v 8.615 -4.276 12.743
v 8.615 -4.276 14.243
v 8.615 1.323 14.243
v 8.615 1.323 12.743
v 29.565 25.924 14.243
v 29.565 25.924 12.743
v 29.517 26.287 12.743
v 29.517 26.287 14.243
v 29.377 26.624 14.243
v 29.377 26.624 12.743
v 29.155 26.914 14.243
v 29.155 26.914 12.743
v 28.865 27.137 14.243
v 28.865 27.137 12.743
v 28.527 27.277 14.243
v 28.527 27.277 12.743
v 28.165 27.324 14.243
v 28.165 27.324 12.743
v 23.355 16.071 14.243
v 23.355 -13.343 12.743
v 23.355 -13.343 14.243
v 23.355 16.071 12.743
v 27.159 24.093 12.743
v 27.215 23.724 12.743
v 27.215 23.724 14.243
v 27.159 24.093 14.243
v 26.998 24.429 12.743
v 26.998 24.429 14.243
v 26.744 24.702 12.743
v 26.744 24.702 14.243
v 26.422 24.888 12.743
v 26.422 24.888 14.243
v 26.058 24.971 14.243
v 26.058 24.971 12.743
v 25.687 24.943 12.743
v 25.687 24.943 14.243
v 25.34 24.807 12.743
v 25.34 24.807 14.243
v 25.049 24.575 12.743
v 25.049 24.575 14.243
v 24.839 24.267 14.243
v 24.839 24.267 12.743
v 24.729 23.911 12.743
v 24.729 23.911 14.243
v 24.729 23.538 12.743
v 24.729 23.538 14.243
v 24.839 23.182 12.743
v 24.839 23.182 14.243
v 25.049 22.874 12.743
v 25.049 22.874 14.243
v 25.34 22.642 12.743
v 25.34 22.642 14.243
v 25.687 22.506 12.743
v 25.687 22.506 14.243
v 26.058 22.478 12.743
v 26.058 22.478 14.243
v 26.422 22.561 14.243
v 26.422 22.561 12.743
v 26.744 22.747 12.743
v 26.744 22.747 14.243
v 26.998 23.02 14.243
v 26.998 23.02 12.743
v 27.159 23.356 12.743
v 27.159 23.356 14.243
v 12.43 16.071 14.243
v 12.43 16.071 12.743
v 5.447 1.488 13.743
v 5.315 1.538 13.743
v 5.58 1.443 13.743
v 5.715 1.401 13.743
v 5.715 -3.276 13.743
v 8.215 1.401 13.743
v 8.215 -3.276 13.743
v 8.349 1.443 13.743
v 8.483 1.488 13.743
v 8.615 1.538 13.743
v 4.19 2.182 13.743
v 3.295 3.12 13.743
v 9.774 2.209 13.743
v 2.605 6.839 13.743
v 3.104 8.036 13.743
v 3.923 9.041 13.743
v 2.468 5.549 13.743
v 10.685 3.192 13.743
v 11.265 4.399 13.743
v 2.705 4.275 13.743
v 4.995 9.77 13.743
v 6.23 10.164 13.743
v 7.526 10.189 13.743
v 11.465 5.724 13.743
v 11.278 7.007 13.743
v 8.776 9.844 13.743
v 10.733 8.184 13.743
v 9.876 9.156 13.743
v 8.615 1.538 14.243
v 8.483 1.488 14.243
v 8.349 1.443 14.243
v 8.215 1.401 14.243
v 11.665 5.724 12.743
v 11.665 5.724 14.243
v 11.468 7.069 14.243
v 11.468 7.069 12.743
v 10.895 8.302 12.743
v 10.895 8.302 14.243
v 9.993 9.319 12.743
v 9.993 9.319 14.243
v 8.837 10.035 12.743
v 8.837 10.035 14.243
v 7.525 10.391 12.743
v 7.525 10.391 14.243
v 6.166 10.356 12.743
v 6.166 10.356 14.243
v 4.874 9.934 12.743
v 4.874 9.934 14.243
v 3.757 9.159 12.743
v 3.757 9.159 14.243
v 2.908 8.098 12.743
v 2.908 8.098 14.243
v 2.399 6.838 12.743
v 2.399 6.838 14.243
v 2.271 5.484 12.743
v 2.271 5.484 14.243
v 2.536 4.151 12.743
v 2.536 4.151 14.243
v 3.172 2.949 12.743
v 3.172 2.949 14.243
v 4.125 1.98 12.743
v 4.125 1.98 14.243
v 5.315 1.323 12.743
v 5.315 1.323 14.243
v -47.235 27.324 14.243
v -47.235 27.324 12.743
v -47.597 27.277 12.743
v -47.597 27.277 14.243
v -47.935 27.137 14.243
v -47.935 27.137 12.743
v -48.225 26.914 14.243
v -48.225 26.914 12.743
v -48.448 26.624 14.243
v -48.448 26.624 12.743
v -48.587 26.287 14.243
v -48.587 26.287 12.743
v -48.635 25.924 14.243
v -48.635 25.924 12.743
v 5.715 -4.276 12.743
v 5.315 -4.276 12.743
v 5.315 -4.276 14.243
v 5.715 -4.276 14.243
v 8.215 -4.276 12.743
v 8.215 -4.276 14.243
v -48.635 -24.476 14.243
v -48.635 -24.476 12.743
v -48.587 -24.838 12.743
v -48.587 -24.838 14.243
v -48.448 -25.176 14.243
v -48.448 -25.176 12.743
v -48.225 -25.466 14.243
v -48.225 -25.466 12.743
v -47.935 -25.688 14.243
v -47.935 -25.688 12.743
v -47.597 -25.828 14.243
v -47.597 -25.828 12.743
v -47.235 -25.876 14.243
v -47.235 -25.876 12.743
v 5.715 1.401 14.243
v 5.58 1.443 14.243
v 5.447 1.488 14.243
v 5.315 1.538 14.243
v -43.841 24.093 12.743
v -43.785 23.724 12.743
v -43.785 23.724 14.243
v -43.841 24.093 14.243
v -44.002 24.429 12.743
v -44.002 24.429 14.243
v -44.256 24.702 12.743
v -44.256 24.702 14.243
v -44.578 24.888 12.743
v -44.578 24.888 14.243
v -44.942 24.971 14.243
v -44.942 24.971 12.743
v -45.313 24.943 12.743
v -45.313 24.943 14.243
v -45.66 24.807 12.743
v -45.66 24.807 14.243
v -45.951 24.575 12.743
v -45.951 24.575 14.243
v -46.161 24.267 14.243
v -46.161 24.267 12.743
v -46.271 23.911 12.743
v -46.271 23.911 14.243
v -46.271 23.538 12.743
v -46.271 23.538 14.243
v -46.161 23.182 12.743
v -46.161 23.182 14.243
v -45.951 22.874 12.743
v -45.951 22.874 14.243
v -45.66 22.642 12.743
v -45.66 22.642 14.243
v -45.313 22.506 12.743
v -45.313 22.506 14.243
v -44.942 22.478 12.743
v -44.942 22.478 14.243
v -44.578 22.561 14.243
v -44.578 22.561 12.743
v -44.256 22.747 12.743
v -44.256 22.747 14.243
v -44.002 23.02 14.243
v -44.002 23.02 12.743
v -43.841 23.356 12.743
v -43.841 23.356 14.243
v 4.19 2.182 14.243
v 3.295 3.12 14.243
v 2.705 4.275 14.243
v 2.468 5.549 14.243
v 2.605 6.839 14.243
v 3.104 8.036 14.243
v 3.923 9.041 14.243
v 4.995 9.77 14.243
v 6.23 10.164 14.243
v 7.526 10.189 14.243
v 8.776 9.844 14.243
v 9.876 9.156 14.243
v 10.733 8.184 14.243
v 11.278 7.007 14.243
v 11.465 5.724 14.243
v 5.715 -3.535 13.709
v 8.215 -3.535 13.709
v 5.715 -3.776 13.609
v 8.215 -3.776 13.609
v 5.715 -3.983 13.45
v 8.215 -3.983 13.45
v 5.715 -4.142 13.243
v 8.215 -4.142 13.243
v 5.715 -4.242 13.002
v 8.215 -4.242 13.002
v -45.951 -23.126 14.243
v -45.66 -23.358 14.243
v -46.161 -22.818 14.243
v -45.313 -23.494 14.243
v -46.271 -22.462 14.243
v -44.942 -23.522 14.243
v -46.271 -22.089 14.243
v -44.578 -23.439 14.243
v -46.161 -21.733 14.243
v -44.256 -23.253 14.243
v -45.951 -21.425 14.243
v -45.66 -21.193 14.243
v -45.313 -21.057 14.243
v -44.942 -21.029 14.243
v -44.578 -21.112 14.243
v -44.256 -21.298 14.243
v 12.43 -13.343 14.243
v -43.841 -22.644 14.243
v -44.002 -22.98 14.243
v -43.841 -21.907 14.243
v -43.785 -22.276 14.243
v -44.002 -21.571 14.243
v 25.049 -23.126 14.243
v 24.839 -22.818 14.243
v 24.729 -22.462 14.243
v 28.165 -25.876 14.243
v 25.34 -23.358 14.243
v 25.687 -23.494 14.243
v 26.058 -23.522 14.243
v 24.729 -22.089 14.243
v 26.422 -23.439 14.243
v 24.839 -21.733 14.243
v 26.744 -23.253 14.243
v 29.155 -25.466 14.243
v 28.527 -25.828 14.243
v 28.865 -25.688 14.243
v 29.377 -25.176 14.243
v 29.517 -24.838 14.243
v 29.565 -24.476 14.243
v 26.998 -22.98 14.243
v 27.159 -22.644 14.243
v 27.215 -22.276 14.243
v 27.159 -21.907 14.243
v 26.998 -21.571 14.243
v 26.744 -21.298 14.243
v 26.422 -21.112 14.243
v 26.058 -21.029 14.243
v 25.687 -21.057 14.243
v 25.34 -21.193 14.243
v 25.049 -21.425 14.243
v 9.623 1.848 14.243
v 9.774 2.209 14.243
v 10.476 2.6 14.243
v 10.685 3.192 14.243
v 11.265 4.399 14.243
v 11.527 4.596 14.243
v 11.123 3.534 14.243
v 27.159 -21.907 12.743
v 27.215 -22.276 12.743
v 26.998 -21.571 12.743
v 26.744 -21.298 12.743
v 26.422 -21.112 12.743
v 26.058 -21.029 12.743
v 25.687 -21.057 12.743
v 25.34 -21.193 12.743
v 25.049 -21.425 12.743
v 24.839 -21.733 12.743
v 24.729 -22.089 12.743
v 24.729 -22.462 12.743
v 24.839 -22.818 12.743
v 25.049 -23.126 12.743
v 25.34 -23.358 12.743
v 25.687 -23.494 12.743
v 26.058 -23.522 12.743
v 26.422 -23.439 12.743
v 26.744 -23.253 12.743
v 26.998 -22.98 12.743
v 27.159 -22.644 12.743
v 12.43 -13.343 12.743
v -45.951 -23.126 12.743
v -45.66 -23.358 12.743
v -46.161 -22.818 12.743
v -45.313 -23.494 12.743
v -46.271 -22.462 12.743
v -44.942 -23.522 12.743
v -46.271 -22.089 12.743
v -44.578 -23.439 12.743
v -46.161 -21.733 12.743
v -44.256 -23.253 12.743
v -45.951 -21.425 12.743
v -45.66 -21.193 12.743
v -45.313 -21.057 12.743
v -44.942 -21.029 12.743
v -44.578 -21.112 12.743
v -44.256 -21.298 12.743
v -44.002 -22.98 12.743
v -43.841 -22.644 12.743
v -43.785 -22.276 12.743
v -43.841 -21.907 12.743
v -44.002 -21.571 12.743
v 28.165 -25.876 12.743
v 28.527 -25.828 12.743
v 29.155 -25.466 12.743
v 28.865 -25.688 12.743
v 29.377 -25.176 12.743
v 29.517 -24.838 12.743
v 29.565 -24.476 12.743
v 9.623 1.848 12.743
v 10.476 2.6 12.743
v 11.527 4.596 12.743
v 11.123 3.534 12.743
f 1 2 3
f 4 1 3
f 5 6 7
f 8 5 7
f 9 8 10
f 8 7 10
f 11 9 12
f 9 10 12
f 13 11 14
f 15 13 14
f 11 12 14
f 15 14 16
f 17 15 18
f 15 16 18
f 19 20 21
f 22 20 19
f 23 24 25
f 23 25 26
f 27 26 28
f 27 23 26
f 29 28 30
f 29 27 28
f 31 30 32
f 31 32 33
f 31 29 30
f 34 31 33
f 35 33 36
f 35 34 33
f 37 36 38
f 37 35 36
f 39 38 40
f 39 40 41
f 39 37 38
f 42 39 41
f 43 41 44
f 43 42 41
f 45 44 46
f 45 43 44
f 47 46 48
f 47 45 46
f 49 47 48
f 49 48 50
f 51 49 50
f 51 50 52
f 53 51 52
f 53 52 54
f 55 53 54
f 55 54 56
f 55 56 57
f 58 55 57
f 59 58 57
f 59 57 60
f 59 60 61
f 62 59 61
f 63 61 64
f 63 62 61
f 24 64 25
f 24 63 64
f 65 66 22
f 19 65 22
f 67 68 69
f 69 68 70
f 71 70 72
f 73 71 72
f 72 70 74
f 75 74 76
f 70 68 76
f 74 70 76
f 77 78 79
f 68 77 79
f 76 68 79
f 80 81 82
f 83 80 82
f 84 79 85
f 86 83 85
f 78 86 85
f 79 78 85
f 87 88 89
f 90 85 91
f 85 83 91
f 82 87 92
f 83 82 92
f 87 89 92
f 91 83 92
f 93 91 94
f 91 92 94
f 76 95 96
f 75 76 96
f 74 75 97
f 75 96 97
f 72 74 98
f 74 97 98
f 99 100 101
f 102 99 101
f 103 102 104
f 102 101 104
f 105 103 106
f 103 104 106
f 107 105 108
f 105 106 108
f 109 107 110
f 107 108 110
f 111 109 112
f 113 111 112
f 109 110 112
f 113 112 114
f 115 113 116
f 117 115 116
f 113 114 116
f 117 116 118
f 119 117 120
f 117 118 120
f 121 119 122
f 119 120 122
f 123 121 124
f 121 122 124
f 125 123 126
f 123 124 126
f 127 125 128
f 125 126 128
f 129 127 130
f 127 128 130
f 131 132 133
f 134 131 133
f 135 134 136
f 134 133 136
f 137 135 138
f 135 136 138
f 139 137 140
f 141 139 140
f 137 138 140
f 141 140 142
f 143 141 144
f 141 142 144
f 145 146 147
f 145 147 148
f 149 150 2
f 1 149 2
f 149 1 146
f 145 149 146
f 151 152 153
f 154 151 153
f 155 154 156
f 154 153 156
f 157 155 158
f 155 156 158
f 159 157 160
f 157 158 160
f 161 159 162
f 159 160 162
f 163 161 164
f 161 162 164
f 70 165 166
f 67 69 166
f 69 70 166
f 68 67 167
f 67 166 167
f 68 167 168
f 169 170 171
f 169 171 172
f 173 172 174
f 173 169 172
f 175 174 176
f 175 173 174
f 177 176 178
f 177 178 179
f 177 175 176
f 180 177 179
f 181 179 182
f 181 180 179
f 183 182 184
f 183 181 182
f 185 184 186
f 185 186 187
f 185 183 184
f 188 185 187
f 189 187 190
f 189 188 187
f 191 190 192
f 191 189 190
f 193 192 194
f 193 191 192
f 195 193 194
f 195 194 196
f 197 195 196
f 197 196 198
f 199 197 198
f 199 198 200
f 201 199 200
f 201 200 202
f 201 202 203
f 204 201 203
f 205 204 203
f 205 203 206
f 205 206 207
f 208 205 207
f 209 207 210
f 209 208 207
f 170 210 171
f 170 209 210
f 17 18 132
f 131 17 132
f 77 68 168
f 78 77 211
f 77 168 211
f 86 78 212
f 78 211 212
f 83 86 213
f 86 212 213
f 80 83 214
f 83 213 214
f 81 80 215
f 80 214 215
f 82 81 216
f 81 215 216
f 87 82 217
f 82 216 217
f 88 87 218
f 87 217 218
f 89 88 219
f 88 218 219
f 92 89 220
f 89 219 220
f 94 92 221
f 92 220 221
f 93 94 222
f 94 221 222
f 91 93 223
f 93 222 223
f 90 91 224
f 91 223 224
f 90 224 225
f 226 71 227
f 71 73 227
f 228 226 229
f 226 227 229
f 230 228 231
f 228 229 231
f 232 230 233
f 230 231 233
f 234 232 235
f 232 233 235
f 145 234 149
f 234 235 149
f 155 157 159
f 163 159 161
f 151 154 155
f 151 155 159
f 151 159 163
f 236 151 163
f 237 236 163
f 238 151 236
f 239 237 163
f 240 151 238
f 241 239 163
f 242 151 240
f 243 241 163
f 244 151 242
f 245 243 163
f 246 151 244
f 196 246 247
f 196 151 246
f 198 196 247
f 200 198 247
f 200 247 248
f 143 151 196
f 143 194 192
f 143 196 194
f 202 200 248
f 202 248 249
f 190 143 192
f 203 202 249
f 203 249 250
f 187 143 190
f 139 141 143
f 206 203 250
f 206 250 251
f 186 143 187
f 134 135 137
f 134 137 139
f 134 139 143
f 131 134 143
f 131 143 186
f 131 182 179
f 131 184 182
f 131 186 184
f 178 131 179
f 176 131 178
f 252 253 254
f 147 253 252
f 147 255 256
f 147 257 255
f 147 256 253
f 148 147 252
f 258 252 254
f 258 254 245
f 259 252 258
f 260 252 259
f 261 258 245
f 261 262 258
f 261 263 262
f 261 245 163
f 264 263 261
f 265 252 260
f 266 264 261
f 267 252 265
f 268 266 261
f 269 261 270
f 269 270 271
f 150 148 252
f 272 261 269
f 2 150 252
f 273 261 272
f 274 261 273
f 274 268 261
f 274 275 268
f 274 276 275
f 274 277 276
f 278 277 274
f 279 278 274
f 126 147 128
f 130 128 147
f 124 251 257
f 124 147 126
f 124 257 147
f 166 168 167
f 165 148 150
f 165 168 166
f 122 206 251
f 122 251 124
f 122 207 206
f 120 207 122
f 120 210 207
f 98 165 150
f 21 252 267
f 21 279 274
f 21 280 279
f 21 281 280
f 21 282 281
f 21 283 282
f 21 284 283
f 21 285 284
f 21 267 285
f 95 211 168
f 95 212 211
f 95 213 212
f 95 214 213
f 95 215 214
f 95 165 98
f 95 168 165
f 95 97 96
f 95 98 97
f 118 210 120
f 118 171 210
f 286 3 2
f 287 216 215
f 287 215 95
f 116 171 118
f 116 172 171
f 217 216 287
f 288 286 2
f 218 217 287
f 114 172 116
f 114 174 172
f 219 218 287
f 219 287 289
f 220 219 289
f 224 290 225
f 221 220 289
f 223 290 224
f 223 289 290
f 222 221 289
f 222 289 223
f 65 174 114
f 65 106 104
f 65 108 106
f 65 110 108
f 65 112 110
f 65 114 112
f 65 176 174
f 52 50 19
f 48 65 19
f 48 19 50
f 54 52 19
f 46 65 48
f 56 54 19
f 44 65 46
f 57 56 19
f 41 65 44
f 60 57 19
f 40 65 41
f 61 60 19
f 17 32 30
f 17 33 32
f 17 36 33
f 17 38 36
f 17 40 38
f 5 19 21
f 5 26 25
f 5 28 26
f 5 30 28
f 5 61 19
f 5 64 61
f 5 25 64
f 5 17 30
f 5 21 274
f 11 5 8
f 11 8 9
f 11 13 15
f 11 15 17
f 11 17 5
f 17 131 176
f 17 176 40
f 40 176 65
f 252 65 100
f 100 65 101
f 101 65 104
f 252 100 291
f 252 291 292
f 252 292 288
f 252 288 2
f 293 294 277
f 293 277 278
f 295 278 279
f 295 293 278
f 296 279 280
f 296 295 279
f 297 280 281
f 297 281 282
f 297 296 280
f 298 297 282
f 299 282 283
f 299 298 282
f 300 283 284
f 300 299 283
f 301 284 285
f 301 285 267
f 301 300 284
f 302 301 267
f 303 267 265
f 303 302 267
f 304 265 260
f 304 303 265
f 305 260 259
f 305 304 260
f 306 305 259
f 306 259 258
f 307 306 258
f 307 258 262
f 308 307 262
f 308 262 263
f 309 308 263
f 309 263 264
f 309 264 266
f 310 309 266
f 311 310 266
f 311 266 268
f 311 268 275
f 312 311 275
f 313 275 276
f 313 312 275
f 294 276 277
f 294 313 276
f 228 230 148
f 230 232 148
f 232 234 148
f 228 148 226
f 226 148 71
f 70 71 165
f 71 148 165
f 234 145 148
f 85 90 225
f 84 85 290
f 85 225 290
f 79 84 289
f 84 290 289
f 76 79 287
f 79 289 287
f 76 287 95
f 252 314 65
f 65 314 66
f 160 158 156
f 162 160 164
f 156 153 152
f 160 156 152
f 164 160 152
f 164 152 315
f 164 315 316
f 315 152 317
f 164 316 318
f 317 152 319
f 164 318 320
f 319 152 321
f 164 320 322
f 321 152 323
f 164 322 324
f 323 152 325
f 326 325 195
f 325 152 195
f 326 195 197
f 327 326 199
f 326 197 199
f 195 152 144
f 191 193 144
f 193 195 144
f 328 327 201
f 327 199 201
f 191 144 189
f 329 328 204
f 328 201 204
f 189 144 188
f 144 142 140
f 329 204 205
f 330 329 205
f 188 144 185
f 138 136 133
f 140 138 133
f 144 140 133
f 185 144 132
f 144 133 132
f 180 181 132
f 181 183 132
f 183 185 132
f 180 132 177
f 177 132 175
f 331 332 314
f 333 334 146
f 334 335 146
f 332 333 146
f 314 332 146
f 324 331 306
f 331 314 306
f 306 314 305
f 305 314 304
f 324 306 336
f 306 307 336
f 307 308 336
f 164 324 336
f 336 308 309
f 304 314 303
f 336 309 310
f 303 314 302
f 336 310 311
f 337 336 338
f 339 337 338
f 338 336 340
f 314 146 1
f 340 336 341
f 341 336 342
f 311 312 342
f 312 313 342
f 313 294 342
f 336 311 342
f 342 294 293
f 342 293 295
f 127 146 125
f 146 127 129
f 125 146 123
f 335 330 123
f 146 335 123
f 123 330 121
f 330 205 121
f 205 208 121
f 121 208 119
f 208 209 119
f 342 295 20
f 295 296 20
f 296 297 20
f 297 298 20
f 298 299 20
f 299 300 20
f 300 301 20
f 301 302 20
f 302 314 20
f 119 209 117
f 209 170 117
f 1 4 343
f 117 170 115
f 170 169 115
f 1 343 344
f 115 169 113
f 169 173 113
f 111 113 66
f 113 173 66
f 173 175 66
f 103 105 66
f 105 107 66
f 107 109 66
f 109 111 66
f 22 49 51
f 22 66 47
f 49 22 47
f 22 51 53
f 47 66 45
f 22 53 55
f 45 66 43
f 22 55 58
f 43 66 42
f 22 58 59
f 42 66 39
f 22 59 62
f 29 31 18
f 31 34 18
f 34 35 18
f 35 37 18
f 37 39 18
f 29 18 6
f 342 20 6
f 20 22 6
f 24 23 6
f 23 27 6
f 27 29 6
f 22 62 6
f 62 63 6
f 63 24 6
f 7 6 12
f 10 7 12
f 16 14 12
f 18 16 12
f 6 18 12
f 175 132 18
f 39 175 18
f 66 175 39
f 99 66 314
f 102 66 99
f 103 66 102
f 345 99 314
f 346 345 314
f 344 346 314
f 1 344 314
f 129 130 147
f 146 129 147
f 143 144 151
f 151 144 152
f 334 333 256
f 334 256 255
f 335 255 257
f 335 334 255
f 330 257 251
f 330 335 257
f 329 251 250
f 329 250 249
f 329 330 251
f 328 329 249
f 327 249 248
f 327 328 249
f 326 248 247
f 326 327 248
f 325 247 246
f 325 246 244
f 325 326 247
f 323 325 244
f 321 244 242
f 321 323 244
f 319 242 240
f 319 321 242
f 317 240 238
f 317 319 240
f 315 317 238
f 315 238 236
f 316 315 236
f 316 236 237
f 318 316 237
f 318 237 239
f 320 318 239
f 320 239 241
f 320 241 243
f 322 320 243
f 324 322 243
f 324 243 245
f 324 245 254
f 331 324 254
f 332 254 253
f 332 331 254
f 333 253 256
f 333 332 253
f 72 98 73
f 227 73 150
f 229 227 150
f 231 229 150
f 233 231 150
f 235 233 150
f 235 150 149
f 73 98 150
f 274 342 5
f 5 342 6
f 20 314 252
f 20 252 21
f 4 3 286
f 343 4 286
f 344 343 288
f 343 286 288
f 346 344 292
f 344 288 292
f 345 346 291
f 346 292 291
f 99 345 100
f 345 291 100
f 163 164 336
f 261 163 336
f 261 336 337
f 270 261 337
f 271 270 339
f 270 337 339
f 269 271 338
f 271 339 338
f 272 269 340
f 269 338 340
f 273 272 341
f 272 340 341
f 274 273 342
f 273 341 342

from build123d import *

# Parameters (mm, degrees)
SKETCH1_R           = 1.25
SKETCH1_W           = 10.925559674
SKETCH1_H           = 29.413801758
BOSS_EXTRUDE1_DEPTH = 1.5
CUT_EXTRUDE1_DEPTH  = 2.5
CUT_EXTRUDE6_START  = -1.5
CUT_EXTRUDE6_DEPTH  = 1
FILLET1_R           = 1


# Read off the part's stored shape, not the designer's step: Cut-Extrude6
with BuildPart() as part:
    # Sketch1 → Boss-Extrude1 (new body)
    with BuildSketch(Plane.XY.offset(12.743078908)):
        with BuildLine():
            Line((29.564858702, -24.475637141), (29.564858702, 25.924362859))
            ThreePointArc((29.564858702, 25.924362859), (29.154808195, 26.914312353), (28.164858702, 27.324362859))
            Line((28.164858702, 27.324362859), (-47.235141298, 27.324362859))
            ThreePointArc((-47.235141298, 27.324362859), (-48.225090792, 26.914312353), (-48.635141298, 25.924362859))
            Line((-48.635141298, 25.924362859), (-48.635141298, -24.475637141))
            ThreePointArc((-48.635141298, -24.475637141), (-48.225090792, -25.465586635), (-47.235141298, -25.875637141))
            Line((-47.235141298, -25.875637141), (28.164858702, -25.875637141))
            ThreePointArc((28.164858702, -25.875637141), (29.154808195, -25.465586635), (29.564858702, -24.475637141))
        make_face()
        with Locations((-45.035141298, -22.275637141)):
            Circle(SKETCH1_R, mode=Mode.SUBTRACT)
        with Locations((-45.035141298, 23.724362859)):
            Circle(SKETCH1_R, mode=Mode.SUBTRACT)
        with Locations((25.964858702, -22.275637141)):
            Circle(SKETCH1_R, mode=Mode.SUBTRACT)
        with Locations((25.964858702, 23.724362859)):
            Circle(SKETCH1_R, mode=Mode.SUBTRACT)
        with Locations((17.892390482, 1.364242189)):
            Rectangle(SKETCH1_W, SKETCH1_H, mode=Mode.SUBTRACT)
    extrude(amount=BOSS_EXTRUDE1_DEPTH)

    # Sketch2 → Cut-Extrude1 (cut)
    with BuildSketch(Plane.XY.offset(14.243078908)):
        with BuildLine():
            ThreePointArc((8.614677666, 1.323444705), (8.416130841, 1.254039367), (8.214677666, 1.193586405))
            Line((8.214677666, 1.193586405), (8.214677666, -4.275635234))
            Line((8.214677666, -4.275635234), (8.614677666, -4.275635234))
            Line((8.614677666, -4.275635234), (8.614677666, 1.323444705))
        make_face()
        with BuildLine():
            ThreePointArc((11.464858702, 5.724364766), (10.684682981, 3.191992888), (8.614677666, 1.537707701))
            Line((8.614677666, 1.537707701), (8.614677666, 1.323444705))
            ThreePointArc((8.614677666, 1.323444705), (10.827768818, 3.047066607), (11.664858702, 5.724364766))
            ThreePointArc((11.664858702, 5.724364766), (4.287560542, 9.587274882), (5.315039737, 1.323444705))
            Line((5.315039737, 1.323444705), (5.315039737, 1.537707701))
            ThreePointArc((5.315039737, 1.537707701), (4.432486823, 9.444189046), (11.464858702, 5.724364766))
        make_face()
        with BuildLine():
            ThreePointArc((8.614677666, 1.537707701), (8.416278493, 1.464860031), (8.214677666, 1.401408306))
            Line((8.214677666, 1.401408306), (8.214677666, 1.193586405))
            ThreePointArc((8.214677666, 1.193586405), (8.416130841, 1.254039367), (8.614677666, 1.323444705))
            Line((8.614677666, 1.323444705), (8.614677666, 1.537707701))
        make_face()
        with BuildLine():
            Line((5.715039737, -4.275635234), (5.715039737, 1.193586405))
            ThreePointArc((5.715039737, 1.193586405), (5.513586562, 1.254039367), (5.315039737, 1.323444705))
            Line((5.315039737, 1.323444705), (5.315039737, -4.275635234))
            Line((5.315039737, -4.275635234), (5.715039737, -4.275635234))
        make_face()
        with BuildLine():
            Line((5.715039737, 1.193586405), (5.715039737, 1.401408306))
            ThreePointArc((5.715039737, 1.401408306), (5.51343891, 1.464860031), (5.315039737, 1.537707701))
            Line((5.315039737, 1.537707701), (5.315039737, 1.323444705))
            ThreePointArc((5.315039737, 1.323444705), (5.513586562, 1.254039367), (5.715039737, 1.193586405))
        make_face()
    extrude(amount=-CUT_EXTRUDE1_DEPTH, mode=Mode.SUBTRACT)

    # Cut-Extrude6 outline → Cut-Extrude6 (cut)
    with BuildSketch(Plane.XY.offset(14.243078908).offset(CUT_EXTRUDE6_START)):
        with BuildLine():
            Line((5.715039737, 1.401408306), (5.715039737, -4.275635234))
            Line((5.715039737, -4.275635234), (8.214677666, -4.275635234))
            Line((8.214677666, -4.275635234), (8.214677666, 1.401408306))
            ThreePointArc((8.214677666, 1.401408306), (6.964858701, 10.224364766), (5.715039737, 1.401408306))
        make_face()
    extrude(amount=CUT_EXTRUDE6_DEPTH, mode=Mode.SUBTRACT)

    # Fillet1
    fillet1_edges = [part.edges().sort_by_distance(p)[0] for p in [
        (6.964858701, -4.275635234, 13.743078908),
    ]]
    fillet(fillet1_edges, radius=FILLET1_R - 0.0001)  # a hair under: the kernel refuses the full size


solid = part.part
